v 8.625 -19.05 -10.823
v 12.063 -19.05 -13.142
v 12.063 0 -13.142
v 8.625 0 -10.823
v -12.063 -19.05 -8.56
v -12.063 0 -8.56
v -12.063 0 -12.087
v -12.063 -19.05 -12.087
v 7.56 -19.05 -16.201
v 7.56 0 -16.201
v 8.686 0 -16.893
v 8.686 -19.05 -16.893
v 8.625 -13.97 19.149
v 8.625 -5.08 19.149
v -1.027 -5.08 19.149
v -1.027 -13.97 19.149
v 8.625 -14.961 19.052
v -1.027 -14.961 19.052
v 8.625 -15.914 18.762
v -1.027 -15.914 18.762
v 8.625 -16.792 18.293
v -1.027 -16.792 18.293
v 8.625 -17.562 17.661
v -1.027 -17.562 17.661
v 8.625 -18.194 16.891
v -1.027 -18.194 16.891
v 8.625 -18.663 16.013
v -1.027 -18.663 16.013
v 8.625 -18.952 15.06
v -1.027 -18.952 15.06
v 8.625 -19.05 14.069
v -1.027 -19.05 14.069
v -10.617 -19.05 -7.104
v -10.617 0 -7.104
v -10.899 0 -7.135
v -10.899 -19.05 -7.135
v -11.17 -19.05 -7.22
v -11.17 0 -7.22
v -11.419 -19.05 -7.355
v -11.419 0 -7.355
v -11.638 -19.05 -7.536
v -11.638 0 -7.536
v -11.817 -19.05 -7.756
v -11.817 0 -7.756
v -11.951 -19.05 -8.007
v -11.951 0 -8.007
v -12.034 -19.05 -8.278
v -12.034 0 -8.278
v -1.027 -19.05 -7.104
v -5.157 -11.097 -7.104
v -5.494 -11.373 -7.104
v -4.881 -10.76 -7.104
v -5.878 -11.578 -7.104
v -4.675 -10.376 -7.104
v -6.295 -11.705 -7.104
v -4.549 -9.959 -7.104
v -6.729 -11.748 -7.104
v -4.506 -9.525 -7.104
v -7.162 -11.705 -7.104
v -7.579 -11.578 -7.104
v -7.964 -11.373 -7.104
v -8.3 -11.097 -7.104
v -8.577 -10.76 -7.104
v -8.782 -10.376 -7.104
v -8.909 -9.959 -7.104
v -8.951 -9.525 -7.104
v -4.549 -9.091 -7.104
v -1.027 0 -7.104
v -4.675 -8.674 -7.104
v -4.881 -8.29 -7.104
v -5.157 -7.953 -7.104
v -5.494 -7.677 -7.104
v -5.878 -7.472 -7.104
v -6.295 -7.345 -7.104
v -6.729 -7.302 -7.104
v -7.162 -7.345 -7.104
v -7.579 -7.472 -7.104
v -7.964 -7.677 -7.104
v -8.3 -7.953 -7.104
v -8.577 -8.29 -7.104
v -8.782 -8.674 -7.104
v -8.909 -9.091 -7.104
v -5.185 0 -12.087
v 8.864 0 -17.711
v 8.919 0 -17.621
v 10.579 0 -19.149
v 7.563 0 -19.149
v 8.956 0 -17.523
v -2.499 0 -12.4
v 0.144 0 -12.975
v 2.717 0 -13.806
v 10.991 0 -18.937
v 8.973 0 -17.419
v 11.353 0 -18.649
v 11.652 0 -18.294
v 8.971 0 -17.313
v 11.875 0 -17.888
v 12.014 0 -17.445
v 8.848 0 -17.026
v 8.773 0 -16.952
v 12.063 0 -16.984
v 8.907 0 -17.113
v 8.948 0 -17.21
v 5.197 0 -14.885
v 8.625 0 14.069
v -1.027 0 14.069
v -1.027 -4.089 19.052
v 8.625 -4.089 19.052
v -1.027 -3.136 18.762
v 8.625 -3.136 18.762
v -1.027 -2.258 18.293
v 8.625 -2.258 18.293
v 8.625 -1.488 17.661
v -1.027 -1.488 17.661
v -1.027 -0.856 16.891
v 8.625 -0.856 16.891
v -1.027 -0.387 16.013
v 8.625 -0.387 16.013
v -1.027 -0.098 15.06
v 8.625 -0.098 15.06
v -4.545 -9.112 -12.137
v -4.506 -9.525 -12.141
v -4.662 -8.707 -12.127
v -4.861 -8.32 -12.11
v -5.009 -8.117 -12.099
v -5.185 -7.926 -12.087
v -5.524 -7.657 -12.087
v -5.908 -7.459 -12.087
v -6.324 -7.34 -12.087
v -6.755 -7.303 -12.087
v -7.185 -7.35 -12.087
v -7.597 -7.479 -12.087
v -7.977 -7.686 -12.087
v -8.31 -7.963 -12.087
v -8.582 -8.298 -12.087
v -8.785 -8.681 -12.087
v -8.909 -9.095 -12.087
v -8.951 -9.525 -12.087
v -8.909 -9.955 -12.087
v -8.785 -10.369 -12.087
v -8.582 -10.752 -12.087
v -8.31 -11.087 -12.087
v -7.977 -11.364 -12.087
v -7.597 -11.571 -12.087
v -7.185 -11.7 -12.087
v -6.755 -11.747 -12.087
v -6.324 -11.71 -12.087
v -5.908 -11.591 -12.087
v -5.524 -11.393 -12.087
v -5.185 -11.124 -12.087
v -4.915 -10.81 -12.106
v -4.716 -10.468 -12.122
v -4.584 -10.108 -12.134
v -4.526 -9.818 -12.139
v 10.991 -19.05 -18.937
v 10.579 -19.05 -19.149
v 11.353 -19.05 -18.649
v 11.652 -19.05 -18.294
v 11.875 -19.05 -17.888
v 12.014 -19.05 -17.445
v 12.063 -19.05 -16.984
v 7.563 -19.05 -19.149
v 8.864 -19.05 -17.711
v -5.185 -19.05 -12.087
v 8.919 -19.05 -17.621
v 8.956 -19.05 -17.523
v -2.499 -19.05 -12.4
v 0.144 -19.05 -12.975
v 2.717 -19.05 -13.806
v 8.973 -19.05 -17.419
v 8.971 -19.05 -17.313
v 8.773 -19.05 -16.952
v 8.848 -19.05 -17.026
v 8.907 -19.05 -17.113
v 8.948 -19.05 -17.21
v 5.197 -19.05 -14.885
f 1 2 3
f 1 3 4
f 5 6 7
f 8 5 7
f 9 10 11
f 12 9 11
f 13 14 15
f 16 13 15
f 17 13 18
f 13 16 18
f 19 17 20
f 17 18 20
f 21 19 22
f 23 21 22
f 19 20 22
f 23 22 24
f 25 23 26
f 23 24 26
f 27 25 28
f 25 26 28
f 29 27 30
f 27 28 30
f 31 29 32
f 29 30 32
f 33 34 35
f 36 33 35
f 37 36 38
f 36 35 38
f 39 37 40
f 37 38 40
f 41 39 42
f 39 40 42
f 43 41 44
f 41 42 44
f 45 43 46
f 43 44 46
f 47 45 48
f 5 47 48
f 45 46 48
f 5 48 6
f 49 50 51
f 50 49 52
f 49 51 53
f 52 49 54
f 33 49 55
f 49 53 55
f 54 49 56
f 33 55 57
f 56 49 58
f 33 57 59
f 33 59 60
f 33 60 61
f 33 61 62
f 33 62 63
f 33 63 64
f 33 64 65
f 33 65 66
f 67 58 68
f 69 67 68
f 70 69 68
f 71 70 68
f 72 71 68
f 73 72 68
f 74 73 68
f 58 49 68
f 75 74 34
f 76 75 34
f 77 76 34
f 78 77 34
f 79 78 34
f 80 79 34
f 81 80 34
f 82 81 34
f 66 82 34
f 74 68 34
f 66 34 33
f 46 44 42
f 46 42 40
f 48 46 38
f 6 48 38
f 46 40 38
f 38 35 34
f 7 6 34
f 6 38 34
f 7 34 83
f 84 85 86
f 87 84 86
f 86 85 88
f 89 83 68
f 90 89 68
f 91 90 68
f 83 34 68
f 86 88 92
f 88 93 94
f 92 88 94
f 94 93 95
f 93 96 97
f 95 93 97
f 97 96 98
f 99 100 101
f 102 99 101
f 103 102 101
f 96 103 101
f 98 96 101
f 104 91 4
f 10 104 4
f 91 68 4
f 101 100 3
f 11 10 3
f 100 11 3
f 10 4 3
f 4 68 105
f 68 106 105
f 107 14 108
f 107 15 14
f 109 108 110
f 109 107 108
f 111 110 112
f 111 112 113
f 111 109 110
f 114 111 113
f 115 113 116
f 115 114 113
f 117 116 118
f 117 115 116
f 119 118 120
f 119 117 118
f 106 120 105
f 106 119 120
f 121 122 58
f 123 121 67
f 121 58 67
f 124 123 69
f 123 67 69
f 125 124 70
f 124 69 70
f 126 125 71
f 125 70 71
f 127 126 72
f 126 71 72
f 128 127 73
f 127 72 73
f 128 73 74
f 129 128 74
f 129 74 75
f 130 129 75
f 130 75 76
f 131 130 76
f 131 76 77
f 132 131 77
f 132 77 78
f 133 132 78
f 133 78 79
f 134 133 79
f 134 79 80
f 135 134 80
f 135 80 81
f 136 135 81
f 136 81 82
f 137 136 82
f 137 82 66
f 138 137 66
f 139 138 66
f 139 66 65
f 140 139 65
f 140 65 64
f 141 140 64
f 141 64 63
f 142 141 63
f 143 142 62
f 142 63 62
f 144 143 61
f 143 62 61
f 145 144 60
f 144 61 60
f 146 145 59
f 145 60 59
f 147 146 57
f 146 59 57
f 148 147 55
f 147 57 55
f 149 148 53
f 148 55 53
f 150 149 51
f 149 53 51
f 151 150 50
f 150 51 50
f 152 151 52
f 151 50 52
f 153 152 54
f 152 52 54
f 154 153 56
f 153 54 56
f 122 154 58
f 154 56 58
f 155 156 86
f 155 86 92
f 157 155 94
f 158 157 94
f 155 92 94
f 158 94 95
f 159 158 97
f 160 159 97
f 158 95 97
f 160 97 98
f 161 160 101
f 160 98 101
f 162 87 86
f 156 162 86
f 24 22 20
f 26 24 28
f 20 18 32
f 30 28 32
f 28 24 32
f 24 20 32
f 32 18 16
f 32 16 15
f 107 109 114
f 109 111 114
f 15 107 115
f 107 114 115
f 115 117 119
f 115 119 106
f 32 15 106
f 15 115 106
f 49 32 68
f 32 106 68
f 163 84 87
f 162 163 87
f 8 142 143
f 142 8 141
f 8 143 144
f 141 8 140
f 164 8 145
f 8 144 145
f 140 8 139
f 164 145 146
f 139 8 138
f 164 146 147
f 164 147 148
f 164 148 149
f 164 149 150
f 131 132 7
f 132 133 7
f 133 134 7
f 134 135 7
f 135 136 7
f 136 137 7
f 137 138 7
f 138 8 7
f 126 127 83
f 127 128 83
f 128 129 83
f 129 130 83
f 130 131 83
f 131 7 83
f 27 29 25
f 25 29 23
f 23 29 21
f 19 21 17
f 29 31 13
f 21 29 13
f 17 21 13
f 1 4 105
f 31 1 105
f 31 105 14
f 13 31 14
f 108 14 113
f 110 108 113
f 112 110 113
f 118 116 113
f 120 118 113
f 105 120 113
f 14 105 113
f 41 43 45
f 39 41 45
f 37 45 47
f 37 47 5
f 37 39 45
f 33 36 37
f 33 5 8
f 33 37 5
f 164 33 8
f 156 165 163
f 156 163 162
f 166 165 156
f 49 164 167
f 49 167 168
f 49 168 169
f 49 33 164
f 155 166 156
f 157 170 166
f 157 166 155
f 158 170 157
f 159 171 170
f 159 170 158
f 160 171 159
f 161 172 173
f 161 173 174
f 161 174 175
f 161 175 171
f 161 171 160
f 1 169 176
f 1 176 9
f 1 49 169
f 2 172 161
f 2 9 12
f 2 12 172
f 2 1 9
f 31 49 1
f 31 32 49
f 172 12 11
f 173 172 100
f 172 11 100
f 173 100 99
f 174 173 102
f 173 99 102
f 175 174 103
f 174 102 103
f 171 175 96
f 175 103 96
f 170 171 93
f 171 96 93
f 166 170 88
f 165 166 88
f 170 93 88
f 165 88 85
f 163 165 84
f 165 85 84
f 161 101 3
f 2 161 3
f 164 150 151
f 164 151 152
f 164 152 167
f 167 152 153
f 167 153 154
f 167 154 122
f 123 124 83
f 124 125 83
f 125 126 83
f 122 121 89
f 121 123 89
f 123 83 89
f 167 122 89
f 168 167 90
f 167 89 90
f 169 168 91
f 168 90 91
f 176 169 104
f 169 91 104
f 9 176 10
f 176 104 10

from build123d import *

# Parameters (mm, degrees)
F1_DEPTH = 19.05
F2_R     = 5.08
F3_R     = 2.2225
F4_DEPTH = 12.0466452


# Not quite as in the source:
# - ends of sketch curves that miss each other by under 0.0002 mm in the source are joined


with BuildPart() as f1:
    # F0 (on Front) → F1 (new body)
    with BuildSketch(Plane.XZ):
        with BuildLine():
            Line((-12.0627648, -8.5602826), (-12.0627648, -12.0865646))
            Line((-12.0627648, -12.0865646), (-5.1851306, -12.0865646))
            ThreePointArc((-5.1851306, -12.0865646), (1.4407652276, -13.3594055352), (7.5600808337, -16.2013401088))
            Line((7.5600808337, -16.2013401088), (8.6856062, -16.8927272))
            ThreePointArc((8.6856062, -16.8927272), (8.9620015383, -17.2612655931), (8.8635755348, -17.7112866346))
            Line((8.8635755348, -17.7112866346), (7.5629516, -19.149187))
            Line((7.5629516, -19.149187), (10.5785158, -19.149187))
            ThreePointArc((10.5785158, -19.149187), (11.6521464417, -18.2940868169), (12.0627642118, -16.9843959643))
            Line((12.0627642118, -16.9843959643), (12.0627394, -13.1420616))
            Line((12.0627394, -13.1420616), (8.6250272, -10.822813))
            Line((8.6250272, -10.822813), (8.6250272, 19.149187))
            Line((8.6250272, 19.149187), (-1.0269728, 19.149187))
            Line((-1.0269728, 19.149187), (-1.0269728, -7.1035418))
            Line((-1.0269728, -7.1035418), (-10.6173016, -7.1035418))
            ThreePointArc((-10.6173016, -7.1035418), (-11.6378820464, -7.5363696119), (-12.0627648, -8.5602826))
        make_face()
    extrude(amount=F1_DEPTH)

    # F2
    f2_edges = [f1.edges().sort_by_distance(p)[0] for p in [
        (3.799027, -19.05, 19.149187),
        (3.799027, 0, 19.149187),
    ]]
    fillet(f2_edges, radius=F2_R)

    # F3 (on face) → F4 (cut, through all)
    with BuildSketch(Plane.XY.offset(-7.1035418)):
        with Locations((-6.7287706383, -9.525)):
            Circle(F3_R)
    extrude(amount=-F4_DEPTH, mode=Mode.SUBTRACT)


solid = f1.part
